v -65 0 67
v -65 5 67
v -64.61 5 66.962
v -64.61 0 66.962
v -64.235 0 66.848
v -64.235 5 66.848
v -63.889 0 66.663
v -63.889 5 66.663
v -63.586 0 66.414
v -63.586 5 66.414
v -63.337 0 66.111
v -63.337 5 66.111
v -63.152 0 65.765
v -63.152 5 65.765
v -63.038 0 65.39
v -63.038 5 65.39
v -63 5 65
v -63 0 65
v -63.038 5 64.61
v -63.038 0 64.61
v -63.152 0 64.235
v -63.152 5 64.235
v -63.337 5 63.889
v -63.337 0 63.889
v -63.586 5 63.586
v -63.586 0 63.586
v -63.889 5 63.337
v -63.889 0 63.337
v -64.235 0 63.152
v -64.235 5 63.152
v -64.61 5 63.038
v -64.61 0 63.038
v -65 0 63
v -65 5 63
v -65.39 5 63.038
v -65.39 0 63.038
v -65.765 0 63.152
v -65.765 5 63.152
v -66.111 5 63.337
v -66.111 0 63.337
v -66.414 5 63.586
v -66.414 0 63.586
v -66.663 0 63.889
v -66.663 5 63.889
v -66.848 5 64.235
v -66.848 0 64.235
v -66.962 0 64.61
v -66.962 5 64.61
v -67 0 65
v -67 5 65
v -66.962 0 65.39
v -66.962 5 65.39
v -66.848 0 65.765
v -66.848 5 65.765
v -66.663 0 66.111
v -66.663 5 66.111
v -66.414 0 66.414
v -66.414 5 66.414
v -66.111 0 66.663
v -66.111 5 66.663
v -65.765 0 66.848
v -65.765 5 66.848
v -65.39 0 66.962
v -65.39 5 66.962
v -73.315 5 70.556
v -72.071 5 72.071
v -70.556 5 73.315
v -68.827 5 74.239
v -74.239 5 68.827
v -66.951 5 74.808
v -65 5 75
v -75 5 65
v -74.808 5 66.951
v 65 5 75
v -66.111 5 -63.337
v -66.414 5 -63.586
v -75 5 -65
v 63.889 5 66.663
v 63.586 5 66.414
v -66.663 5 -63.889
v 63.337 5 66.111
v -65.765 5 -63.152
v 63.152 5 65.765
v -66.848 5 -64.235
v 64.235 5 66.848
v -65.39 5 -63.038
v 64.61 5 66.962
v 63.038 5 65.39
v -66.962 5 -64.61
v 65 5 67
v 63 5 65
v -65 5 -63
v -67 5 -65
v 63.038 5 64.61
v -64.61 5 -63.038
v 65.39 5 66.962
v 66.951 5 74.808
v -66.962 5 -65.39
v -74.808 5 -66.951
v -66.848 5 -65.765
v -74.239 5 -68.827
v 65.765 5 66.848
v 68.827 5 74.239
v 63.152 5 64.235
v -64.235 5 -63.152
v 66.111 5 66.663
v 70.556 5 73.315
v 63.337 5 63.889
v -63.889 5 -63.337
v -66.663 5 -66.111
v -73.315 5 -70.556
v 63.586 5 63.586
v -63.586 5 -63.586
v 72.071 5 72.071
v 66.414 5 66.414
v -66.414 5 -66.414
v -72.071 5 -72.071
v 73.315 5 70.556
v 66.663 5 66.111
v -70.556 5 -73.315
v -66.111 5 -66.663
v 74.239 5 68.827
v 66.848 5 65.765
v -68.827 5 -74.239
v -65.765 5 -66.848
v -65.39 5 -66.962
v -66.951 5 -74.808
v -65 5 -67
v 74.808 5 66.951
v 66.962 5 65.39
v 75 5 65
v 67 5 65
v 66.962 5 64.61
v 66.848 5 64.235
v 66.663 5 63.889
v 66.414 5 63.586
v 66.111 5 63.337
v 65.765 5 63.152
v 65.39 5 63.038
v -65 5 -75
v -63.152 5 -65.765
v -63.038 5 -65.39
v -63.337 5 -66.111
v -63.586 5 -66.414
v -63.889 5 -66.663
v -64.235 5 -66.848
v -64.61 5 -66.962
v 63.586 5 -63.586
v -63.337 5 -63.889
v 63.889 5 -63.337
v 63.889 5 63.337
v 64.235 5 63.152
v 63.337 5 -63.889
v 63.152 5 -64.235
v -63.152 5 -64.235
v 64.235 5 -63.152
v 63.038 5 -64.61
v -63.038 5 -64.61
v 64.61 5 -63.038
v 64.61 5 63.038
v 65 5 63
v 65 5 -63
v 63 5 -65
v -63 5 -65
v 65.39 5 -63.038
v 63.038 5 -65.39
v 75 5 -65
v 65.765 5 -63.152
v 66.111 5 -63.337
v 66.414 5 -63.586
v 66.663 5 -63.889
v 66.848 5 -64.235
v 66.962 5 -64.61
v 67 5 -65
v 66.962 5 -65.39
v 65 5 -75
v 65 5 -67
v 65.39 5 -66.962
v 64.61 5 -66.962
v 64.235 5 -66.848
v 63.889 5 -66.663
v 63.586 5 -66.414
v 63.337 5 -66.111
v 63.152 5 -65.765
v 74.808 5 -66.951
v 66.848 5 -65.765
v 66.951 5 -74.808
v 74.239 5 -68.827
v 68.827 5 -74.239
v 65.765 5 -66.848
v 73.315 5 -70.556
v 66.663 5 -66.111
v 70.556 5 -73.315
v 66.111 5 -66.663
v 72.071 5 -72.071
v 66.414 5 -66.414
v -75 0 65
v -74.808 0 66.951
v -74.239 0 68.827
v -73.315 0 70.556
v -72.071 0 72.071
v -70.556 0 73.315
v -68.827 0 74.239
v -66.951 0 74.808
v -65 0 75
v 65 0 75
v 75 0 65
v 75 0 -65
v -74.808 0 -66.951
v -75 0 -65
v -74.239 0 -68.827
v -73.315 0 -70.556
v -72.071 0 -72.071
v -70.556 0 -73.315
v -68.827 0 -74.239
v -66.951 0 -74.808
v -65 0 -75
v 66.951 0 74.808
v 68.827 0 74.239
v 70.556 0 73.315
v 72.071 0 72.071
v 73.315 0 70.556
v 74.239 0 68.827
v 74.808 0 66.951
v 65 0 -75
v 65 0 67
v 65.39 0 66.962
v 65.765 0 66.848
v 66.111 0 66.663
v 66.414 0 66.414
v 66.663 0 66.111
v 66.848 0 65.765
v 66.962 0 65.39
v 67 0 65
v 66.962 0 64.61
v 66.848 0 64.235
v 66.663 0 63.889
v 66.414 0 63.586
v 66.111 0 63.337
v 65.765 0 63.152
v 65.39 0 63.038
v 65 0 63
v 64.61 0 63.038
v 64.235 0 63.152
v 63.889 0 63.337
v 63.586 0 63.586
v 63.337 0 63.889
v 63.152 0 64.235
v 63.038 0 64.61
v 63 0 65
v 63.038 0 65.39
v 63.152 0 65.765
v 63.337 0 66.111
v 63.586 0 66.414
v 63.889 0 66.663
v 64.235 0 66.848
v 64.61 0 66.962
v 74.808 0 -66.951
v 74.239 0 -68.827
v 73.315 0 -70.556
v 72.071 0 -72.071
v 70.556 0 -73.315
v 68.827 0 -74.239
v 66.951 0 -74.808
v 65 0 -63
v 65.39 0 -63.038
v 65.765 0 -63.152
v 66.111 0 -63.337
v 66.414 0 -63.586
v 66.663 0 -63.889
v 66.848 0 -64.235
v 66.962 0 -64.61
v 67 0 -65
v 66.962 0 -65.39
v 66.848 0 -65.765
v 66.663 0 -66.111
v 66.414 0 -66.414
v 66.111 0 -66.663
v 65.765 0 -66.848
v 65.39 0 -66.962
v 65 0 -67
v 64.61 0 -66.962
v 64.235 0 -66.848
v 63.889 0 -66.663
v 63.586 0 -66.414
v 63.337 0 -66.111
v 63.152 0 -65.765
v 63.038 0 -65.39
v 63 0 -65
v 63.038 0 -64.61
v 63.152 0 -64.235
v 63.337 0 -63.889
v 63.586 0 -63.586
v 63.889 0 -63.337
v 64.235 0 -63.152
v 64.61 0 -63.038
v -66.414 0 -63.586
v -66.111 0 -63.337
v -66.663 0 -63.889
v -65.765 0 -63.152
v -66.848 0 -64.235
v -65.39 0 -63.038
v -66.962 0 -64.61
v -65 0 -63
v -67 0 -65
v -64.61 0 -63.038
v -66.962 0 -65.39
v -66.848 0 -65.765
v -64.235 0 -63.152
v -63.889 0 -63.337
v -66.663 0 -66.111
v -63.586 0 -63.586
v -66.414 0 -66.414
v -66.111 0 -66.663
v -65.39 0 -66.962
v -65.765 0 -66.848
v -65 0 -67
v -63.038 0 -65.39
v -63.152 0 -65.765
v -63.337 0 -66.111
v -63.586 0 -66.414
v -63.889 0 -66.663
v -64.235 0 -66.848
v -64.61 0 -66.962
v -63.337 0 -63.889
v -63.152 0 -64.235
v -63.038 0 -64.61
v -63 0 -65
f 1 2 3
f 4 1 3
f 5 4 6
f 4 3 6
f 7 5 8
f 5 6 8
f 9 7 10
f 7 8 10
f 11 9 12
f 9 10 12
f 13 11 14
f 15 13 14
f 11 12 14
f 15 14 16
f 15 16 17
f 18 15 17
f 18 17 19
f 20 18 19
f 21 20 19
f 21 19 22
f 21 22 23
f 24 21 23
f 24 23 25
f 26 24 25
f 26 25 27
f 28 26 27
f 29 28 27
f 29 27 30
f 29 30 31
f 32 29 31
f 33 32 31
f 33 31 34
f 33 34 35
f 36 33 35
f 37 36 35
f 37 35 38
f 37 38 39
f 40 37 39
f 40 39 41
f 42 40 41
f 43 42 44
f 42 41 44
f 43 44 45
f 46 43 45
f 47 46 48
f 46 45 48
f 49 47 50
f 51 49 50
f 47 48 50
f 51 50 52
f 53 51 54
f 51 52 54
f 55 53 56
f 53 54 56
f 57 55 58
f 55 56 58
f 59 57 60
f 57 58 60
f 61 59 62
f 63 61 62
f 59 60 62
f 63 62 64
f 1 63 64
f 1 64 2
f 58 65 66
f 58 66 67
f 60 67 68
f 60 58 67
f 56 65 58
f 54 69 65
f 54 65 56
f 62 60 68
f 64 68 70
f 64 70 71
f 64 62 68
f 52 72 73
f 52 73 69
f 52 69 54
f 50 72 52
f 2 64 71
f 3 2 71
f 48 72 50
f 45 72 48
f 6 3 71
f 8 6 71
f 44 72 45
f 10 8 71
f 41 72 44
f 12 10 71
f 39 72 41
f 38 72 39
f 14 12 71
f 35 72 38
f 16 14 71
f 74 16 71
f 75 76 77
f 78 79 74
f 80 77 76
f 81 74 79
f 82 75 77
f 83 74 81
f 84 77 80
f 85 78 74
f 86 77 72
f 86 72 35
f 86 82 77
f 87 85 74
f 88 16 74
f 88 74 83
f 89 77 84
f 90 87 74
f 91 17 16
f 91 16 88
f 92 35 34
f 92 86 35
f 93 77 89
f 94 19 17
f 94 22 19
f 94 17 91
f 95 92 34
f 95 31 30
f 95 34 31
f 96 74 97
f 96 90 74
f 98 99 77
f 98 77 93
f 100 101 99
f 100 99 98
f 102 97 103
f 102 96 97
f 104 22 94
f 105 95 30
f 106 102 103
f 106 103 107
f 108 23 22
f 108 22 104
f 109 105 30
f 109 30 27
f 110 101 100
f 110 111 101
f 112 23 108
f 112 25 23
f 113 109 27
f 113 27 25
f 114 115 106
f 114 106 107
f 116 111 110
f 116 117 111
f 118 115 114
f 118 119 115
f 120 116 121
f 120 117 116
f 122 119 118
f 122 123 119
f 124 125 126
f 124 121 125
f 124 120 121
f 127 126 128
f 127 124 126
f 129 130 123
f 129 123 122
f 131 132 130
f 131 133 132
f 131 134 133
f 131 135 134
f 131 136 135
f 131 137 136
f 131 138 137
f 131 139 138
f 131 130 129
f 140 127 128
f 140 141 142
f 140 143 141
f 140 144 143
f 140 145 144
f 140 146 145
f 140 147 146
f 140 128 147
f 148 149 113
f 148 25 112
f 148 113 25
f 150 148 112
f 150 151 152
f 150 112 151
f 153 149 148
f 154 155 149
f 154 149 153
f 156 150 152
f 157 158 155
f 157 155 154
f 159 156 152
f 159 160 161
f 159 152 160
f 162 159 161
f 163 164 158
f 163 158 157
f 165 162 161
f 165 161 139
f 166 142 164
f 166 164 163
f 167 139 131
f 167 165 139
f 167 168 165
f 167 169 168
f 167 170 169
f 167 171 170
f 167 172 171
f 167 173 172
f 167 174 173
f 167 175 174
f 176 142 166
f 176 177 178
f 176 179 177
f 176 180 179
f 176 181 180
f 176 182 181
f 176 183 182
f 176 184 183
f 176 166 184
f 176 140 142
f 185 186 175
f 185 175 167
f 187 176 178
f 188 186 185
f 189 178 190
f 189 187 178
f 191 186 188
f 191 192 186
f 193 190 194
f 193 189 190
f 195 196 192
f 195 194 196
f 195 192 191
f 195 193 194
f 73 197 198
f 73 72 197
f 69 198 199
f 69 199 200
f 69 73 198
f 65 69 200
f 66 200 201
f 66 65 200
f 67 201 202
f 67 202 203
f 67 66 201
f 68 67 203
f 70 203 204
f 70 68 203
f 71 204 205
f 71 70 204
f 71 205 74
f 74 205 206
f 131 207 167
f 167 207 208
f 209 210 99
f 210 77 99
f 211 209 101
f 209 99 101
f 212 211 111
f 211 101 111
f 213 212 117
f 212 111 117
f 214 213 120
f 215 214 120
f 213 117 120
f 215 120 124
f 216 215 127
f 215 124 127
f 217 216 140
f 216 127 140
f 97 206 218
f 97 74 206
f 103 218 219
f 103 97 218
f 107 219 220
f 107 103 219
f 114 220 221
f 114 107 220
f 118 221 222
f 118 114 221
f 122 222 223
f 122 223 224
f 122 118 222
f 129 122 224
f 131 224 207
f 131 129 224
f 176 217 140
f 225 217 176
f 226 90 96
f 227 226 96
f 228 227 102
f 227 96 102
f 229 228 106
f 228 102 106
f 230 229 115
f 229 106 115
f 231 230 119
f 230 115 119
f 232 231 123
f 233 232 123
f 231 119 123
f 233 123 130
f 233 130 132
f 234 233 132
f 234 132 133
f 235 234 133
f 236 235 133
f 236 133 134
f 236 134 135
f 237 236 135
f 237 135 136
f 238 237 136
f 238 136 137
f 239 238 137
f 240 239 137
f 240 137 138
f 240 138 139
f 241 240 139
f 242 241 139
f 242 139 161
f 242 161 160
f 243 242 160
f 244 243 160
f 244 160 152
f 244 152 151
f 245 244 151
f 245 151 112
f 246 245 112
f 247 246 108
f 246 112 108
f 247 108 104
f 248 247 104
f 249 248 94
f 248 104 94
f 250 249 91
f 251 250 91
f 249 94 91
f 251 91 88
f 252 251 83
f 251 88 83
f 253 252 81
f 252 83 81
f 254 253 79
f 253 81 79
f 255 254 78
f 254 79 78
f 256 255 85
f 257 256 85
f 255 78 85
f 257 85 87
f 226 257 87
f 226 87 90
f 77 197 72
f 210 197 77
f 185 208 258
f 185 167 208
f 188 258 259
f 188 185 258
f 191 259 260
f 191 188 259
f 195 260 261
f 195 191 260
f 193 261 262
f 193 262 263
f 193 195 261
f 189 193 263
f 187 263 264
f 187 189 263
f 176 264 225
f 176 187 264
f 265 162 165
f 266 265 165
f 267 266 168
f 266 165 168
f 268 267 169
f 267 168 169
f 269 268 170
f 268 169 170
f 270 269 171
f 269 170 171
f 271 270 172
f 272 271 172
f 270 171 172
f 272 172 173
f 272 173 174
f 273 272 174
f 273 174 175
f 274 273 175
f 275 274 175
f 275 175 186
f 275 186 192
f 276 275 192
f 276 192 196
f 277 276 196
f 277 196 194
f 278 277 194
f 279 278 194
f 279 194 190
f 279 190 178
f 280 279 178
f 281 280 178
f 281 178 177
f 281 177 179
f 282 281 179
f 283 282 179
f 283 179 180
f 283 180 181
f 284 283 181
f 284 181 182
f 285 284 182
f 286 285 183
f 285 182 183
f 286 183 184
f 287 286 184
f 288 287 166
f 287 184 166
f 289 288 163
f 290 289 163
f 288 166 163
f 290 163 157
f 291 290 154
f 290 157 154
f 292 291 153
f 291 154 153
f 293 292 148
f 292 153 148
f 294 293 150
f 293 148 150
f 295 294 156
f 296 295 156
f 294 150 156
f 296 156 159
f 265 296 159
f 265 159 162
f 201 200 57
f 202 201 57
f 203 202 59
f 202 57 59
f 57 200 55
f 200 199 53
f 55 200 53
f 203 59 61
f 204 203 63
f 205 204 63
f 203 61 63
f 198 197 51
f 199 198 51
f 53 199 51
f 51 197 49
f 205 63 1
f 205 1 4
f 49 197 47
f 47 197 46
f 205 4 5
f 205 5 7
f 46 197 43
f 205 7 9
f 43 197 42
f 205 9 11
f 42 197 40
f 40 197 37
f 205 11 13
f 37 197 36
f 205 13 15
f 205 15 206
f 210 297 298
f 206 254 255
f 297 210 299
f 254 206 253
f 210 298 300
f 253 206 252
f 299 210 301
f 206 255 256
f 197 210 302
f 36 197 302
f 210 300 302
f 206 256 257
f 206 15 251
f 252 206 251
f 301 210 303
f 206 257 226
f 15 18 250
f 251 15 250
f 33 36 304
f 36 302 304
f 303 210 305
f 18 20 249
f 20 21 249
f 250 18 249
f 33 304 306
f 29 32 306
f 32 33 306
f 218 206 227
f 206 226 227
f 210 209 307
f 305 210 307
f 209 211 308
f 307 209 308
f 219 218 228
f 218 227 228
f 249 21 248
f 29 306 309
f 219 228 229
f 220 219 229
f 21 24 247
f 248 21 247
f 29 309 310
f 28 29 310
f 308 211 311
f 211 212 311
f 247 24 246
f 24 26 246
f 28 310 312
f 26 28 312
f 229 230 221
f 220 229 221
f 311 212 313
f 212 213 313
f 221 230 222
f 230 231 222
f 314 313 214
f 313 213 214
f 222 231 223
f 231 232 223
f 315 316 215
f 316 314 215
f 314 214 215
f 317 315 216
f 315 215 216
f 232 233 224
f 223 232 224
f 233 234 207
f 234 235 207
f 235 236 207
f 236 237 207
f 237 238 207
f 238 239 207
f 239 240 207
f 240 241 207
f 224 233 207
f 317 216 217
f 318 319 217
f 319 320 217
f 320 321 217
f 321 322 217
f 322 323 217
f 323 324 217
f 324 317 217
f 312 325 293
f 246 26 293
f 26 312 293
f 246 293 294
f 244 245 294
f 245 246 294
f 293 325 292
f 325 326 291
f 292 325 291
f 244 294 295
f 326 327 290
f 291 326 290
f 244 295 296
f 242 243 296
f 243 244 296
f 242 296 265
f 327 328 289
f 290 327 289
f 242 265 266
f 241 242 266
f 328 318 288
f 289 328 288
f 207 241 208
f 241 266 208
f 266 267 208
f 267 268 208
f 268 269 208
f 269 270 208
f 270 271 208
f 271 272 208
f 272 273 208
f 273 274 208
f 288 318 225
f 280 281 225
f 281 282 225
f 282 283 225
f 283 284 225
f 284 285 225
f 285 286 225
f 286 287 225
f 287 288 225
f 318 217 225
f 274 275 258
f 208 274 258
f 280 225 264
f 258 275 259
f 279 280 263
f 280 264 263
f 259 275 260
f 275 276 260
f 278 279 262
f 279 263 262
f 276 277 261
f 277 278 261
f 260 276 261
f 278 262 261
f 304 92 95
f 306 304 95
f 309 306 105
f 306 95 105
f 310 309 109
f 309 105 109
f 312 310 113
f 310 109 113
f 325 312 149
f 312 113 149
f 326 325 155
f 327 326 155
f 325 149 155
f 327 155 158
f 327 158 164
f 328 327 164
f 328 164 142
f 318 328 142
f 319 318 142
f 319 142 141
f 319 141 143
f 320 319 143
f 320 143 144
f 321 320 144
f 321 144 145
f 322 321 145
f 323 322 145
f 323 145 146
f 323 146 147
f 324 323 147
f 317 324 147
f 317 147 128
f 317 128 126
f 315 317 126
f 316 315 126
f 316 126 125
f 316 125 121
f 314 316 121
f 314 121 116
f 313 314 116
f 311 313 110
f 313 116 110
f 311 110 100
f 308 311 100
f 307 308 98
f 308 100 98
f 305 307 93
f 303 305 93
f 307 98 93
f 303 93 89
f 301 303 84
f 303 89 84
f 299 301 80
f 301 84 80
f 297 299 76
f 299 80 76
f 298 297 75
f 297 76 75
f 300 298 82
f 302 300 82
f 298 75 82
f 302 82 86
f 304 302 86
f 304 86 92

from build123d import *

# Parameters (mm, degrees)
SKETCH1_W           = 150
SKETCH1_H           = 150
BOSS_EXTRUDE1_DEPTH = 5
FILLET1_R           = 10
SKETCH2_R           = 2
CUT_EXTRUDE1_DEPTH  = 107.183802908


with BuildPart() as part:
    # Sketch1 → Boss-Extrude1 (new body)
    with BuildSketch(Plane(origin=(0, 0, 0), x_dir=(1, 0, 0), z_dir=(0, 1, 0))):
        Rectangle(SKETCH1_W, SKETCH1_H)
    extrude(amount=BOSS_EXTRUDE1_DEPTH)

    # Fillet1
    fillet1_edges = [part.edges().sort_by_distance(p)[0] for p in [
        (-75, 2.5, -75),
        (-75, 2.5, 75),
        (75, 2.5, 75),
        (75, 2.5, -75),
    ]]
    fillet(fillet1_edges, radius=FILLET1_R)

    # Sketch2 → Cut-Extrude1 (cut, through all)
    with BuildSketch(Plane(origin=(0, 5, 0), x_dir=(1, 0, 0), z_dir=(0, 1, 0))):
        with Locations(Location((65, 65, 0), (0, 0, 270))):
            Circle(SKETCH2_R)
        with Locations(Location((-65, 65, 0), (0, 0, 270))):
            Circle(SKETCH2_R)
        with Locations(Location((-65, -65, 0), (0, 0, 270))):
            Circle(SKETCH2_R)
        with Locations(Location((65, -65, 0), (0, 0, 270))):
            Circle(SKETCH2_R)
    extrude(amount=-CUT_EXTRUDE1_DEPTH, mode=Mode.SUBTRACT)


solid = part.part
